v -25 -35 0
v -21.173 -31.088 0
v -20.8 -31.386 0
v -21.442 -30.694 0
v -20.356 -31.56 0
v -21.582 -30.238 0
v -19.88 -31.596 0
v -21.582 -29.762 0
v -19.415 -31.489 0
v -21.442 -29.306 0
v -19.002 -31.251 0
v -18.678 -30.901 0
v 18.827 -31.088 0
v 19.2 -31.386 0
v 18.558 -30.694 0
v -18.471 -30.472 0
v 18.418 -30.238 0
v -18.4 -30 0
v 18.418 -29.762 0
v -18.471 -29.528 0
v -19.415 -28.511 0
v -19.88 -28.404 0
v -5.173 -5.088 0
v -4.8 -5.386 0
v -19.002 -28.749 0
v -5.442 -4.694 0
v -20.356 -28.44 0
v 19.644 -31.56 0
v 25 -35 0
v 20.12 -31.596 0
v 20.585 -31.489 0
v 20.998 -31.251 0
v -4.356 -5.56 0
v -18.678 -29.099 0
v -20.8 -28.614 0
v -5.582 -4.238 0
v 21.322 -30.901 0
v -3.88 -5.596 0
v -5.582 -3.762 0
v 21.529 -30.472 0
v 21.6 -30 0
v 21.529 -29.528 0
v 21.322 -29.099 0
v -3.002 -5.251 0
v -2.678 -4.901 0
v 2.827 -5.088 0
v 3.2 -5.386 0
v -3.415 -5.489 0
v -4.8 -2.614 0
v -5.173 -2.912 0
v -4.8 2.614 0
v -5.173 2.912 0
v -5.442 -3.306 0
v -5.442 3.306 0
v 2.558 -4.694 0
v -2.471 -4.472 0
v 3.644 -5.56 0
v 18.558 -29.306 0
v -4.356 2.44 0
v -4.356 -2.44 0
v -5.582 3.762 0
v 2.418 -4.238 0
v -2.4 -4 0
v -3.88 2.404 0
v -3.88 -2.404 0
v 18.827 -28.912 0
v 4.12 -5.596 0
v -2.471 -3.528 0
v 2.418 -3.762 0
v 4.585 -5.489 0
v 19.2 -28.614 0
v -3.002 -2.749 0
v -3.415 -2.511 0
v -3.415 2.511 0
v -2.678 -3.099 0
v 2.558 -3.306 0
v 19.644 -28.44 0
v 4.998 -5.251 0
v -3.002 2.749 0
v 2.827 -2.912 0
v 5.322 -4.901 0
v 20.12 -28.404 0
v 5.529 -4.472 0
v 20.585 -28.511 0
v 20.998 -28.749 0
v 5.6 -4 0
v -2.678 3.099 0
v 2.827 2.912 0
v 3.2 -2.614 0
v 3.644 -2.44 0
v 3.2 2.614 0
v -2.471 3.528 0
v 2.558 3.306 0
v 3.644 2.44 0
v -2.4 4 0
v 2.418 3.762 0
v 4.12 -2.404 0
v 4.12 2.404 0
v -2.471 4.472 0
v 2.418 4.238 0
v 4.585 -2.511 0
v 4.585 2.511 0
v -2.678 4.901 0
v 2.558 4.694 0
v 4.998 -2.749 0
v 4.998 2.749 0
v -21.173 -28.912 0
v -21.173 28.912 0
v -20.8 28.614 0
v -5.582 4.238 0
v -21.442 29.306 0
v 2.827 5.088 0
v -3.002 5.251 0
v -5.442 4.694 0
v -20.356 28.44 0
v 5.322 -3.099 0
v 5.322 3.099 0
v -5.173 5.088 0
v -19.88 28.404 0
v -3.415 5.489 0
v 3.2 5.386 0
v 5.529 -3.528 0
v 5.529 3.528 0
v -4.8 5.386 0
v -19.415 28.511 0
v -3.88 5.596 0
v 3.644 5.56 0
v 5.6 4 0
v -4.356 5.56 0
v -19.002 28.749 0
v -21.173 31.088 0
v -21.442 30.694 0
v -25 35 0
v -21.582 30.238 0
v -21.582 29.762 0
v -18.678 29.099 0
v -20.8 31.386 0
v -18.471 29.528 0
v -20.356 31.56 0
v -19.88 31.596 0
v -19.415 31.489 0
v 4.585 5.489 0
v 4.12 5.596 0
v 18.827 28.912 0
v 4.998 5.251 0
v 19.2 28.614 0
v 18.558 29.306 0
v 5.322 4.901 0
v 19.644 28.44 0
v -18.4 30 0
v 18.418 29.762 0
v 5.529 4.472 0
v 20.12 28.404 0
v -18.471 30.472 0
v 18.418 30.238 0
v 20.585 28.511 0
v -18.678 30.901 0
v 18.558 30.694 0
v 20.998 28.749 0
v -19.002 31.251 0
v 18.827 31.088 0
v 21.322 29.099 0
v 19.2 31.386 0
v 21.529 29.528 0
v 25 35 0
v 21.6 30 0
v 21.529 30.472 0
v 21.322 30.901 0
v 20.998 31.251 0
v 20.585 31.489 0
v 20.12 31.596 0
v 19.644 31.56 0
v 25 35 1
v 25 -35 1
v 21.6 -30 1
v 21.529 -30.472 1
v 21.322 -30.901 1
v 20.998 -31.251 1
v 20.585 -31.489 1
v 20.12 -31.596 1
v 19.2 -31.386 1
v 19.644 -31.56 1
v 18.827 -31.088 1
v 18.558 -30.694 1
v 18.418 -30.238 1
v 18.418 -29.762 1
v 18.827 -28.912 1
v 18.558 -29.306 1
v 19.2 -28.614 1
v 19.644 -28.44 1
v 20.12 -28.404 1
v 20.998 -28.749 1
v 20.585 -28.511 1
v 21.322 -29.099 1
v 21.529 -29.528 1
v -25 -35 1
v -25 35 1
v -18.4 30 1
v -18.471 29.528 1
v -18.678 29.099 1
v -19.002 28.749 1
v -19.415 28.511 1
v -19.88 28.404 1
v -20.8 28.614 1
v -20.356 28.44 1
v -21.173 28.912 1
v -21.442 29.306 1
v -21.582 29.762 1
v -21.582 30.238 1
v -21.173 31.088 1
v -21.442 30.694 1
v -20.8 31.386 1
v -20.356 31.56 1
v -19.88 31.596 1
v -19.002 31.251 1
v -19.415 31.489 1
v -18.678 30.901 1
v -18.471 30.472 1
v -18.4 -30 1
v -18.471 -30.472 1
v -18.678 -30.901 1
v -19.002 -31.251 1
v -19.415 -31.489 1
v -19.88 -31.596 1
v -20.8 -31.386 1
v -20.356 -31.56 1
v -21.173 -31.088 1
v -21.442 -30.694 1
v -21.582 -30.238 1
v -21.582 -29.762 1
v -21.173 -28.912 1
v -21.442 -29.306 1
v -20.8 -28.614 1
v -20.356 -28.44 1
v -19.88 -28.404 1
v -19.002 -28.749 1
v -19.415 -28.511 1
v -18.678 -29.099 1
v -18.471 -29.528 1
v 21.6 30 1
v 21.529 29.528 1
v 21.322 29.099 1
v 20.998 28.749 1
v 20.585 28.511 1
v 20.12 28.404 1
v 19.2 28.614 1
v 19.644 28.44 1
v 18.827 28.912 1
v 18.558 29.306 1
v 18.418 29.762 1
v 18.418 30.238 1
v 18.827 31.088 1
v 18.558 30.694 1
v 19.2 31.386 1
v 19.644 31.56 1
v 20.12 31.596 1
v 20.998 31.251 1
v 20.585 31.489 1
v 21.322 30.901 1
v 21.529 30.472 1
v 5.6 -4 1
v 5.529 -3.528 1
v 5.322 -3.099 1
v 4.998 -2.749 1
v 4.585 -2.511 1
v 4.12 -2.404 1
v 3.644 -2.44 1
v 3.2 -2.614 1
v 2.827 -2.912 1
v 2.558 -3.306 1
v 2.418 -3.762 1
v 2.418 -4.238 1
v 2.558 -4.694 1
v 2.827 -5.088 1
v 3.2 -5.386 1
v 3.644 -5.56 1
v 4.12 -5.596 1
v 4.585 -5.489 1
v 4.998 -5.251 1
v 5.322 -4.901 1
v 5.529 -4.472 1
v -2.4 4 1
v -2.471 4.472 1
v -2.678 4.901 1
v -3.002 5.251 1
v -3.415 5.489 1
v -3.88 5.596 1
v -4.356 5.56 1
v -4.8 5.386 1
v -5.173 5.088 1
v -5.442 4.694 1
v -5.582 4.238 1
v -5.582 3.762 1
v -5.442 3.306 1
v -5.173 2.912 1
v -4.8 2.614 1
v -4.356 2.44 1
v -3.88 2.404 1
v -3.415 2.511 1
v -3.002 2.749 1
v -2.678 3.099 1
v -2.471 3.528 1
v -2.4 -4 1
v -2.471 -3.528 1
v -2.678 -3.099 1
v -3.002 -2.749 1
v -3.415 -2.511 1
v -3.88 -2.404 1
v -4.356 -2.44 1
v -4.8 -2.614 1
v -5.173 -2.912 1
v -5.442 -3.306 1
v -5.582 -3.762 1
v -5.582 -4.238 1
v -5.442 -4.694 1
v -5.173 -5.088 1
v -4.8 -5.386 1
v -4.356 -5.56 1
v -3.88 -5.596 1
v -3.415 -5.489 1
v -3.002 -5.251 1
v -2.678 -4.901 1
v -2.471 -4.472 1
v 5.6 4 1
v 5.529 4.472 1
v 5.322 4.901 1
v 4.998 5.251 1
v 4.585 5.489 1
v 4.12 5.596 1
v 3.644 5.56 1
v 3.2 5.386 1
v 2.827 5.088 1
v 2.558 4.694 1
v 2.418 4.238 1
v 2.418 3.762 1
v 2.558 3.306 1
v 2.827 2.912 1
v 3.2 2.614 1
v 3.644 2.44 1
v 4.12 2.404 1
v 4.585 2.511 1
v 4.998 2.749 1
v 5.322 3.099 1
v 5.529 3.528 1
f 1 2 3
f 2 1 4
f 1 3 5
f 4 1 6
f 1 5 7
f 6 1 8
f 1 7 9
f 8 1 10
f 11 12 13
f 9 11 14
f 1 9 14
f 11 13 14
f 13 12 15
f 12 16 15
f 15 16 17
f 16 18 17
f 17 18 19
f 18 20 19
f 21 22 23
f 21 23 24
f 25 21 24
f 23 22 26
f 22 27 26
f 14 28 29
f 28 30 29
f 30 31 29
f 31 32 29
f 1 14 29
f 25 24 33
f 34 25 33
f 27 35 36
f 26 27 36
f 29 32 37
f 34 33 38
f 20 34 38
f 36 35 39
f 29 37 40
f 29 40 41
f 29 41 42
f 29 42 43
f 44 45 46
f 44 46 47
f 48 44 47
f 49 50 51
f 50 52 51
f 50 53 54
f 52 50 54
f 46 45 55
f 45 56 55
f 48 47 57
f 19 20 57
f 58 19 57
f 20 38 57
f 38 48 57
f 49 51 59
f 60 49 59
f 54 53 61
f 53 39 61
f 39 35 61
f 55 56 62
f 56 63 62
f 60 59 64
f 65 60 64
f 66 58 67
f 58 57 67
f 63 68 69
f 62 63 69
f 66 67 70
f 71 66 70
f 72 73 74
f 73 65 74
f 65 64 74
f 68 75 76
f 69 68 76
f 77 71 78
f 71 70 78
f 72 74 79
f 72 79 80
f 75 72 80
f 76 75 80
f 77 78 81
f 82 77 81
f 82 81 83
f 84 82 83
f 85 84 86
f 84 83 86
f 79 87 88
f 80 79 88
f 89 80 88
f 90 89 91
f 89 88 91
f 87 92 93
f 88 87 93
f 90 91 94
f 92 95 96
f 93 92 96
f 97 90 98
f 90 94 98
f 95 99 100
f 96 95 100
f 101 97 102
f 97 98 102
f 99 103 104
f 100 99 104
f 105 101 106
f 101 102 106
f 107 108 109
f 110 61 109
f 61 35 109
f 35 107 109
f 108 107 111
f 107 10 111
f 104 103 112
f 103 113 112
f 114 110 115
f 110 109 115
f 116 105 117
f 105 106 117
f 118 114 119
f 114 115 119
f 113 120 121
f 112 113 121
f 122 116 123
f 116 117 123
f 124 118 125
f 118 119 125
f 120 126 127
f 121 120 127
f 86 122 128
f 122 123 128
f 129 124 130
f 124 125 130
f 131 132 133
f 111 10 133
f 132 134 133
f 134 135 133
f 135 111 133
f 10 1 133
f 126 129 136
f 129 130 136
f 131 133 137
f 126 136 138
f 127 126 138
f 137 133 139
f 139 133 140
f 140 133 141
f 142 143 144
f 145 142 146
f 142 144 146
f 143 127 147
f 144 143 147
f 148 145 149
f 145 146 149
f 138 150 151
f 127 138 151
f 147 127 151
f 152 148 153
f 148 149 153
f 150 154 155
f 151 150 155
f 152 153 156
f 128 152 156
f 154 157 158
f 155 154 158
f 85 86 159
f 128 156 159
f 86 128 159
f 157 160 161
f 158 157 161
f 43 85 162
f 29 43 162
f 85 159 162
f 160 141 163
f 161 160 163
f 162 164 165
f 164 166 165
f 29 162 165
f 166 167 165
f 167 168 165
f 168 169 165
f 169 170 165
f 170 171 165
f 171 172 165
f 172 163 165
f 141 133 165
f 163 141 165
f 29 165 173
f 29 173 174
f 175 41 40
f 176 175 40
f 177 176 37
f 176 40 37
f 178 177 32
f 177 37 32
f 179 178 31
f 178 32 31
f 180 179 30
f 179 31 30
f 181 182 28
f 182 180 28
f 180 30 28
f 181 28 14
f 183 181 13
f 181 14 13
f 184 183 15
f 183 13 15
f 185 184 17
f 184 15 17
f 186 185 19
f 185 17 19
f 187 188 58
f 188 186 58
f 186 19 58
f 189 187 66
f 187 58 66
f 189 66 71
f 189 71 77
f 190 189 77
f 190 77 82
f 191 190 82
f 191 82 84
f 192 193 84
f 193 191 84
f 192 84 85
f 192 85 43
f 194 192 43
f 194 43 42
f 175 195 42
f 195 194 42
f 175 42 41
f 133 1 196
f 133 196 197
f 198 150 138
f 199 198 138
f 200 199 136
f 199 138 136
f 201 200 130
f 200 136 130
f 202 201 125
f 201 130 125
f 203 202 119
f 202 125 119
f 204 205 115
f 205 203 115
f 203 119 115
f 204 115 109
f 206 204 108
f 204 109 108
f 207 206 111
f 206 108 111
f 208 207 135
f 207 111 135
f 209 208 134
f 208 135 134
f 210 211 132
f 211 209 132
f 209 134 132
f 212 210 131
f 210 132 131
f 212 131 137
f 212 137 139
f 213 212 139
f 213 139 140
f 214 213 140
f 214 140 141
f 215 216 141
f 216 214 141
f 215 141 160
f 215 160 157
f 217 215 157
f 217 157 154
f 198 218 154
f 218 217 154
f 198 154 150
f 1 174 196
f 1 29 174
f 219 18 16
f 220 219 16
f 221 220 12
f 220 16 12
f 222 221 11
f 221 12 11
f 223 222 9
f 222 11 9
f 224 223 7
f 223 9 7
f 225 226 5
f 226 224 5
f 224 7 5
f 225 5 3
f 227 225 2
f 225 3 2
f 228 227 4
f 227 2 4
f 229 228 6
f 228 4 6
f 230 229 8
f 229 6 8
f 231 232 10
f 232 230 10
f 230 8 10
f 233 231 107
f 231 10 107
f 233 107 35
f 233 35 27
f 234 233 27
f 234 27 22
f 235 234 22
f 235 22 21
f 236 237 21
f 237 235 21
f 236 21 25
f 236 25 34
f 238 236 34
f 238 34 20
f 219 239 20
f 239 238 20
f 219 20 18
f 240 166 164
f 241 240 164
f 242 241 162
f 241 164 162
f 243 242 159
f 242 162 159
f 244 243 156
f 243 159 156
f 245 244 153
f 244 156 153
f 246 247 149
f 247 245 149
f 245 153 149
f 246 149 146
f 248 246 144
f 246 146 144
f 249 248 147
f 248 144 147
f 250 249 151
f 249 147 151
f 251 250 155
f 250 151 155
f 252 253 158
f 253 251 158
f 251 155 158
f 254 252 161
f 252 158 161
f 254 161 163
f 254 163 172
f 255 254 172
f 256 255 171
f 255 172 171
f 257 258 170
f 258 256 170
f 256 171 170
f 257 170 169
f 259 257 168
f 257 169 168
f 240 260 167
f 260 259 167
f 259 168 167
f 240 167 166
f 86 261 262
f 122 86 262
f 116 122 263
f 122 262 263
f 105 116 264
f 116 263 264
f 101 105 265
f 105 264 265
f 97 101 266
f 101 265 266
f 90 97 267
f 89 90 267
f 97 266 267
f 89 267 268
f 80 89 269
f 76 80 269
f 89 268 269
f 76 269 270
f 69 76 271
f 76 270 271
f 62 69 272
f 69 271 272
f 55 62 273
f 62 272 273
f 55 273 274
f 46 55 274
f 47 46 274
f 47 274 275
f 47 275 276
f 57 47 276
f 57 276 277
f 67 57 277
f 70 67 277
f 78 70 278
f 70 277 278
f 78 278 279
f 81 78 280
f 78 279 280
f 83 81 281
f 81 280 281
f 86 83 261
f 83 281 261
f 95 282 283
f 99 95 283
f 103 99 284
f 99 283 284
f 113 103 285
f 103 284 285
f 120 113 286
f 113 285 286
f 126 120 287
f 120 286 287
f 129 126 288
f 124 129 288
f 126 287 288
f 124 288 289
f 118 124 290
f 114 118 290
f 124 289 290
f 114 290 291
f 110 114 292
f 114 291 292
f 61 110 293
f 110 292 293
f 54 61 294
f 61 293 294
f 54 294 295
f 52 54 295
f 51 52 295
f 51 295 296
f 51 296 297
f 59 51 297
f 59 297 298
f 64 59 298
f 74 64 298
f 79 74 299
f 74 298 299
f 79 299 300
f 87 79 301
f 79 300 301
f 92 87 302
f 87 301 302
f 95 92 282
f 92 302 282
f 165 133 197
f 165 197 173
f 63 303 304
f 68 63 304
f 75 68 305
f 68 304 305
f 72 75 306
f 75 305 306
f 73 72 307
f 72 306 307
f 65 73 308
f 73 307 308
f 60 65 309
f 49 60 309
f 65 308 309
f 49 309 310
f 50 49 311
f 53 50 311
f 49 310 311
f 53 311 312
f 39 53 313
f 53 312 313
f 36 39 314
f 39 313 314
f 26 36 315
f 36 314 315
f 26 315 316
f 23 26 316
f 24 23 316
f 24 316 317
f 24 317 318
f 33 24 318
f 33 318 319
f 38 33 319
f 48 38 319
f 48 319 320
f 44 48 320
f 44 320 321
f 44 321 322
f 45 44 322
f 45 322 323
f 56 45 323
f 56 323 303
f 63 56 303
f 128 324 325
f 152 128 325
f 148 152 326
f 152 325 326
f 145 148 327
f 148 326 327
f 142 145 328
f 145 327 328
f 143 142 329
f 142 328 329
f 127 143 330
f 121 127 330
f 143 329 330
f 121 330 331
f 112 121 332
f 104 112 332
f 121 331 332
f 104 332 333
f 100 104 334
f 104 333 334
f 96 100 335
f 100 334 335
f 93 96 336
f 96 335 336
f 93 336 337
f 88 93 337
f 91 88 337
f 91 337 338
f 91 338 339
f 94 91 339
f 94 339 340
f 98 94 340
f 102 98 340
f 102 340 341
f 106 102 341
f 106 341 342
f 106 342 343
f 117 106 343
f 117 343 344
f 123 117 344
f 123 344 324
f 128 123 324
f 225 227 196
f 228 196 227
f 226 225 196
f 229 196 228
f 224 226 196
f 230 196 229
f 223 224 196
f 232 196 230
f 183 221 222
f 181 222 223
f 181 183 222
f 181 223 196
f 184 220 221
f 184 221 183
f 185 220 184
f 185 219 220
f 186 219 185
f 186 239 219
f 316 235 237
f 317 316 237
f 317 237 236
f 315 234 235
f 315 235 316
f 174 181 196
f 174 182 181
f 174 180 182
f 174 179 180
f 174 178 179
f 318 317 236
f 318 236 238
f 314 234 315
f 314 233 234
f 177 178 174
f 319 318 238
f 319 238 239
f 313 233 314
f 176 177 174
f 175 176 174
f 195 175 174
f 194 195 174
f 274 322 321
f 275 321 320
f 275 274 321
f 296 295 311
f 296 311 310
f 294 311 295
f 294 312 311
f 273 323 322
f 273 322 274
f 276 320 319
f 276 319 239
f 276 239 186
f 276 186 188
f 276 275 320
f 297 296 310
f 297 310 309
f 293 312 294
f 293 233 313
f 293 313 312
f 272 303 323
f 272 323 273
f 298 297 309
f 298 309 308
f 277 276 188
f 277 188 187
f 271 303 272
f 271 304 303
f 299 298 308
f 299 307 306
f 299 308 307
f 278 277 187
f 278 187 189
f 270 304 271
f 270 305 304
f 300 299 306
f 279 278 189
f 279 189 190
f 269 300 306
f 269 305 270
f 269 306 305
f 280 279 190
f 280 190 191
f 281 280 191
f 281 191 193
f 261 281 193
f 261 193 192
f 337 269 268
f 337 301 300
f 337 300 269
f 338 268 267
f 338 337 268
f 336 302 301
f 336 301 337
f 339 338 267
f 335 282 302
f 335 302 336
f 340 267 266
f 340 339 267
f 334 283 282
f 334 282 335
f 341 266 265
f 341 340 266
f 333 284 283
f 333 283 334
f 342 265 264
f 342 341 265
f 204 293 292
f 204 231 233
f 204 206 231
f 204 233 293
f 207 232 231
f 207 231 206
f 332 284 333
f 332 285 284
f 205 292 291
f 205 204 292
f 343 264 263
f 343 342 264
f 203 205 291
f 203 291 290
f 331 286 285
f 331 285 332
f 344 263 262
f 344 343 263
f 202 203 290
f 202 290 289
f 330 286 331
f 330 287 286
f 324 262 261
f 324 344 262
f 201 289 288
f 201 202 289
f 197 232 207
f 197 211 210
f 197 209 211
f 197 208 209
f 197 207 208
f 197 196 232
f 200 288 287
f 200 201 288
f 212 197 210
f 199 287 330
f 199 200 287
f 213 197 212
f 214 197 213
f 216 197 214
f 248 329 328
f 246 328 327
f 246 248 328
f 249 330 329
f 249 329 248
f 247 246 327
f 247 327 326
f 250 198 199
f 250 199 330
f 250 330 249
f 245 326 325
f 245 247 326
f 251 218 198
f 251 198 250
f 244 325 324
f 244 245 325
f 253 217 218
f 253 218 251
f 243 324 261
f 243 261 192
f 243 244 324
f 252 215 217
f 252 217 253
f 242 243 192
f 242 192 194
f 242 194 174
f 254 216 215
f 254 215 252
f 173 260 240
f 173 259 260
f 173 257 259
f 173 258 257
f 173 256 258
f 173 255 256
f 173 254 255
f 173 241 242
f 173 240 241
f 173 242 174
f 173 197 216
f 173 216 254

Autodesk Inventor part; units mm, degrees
ref_plane "YZ Plane" through (0, 0, 0) normal (1, 0, 0) x (0, 1, 0)
ref_plane "XZ Plane" through (0, 0, 0) normal (0, 1, 0) x (-1, 0, 0)
ref_plane "XY Plane" through (0, 0, 0) normal (0, 0, 1) x (1, 0, 0)
sketch "Sketch1" plane through (0, 0, 0) normal (0, 0, 1) x (1, 0, 0)
  line L0 (-25, 35) -> (25, 35)
  line L1 (25, 35) -> (25, -35)
  line L2 (25, -35) -> (-25, -35)
  line L3 (-25, -35) -> (-25, 35)
  line L4 (-25, 35) -> (25, -35) construction
  line L5 (25, 35) -> (-25, -35) construction
  circle A0 centre (-20, 30) radius 1.6
  line L6 (0, 0) -> (0, 8.6163)
  line L7 (0, 0) -> (6.049, 0)
  circle A1 centre (20, 30) radius 1.6
  circle A2 centre (-20, -30) radius 1.6
  circle A3 centre (20, -30) radius 1.6
  dimension "d0" = 50
  dimension "d1" = 70
  dimension "d12" = 3.2
  dimension "d13" = 5
  dimension "d18" = 5
extrude "Plate1" add sketch "Sketch1" along normal blind 1
sketch "Sketch2" plane through (0, 0, 1) normal (0, 0, 1) x (1, 0, 0)
  circle A0 centre (-4, 4) radius 1.6
  line L0 (-25, 35) -> (25, 35) projected
  line L1 (0, 0) -> (10.5452, 0)
  line L2 (-4, 4) -> (-0.3431, 4)
  line L3 (-0.3431, 4) -> (-0.3431, 2.4)
  circle A1 centre (4, 4) radius 1.6
  circle A2 centre (-4, -4) radius 1.6
  circle A3 centre (4, -4) radius 1.6
  point P0 (0, 35)
  dimension "d20" = 3.2
  dimension "d24" = 8
  dimension "d27" = 8
  dimension "d30" = 4
  dimension "d31" = 4
extrude "Extrusion1" cut sketch "Sketch2" against normal blind 10
equation "\"d2\" = 厚度"
equation "\"折彎半徑\" = 厚度"
equation "\"折彎離隙寬度\" = 厚度"
equation "\"折彎離隙深度\" = 0.5 * 厚度"
equation "\"轉角離隙大小\" = 4 * 厚度"
equation "\"最小剩餘\" = 2 * 厚度"
equation "\"轉移半徑\" = 折彎半徑"
equation "\"Jacobi半徑大小\" = 折彎半徑"
equation "\"間隙大小\" = 厚度"
equation "\"厚度\" = 1"
properties part number "signal_combiner_plate"
